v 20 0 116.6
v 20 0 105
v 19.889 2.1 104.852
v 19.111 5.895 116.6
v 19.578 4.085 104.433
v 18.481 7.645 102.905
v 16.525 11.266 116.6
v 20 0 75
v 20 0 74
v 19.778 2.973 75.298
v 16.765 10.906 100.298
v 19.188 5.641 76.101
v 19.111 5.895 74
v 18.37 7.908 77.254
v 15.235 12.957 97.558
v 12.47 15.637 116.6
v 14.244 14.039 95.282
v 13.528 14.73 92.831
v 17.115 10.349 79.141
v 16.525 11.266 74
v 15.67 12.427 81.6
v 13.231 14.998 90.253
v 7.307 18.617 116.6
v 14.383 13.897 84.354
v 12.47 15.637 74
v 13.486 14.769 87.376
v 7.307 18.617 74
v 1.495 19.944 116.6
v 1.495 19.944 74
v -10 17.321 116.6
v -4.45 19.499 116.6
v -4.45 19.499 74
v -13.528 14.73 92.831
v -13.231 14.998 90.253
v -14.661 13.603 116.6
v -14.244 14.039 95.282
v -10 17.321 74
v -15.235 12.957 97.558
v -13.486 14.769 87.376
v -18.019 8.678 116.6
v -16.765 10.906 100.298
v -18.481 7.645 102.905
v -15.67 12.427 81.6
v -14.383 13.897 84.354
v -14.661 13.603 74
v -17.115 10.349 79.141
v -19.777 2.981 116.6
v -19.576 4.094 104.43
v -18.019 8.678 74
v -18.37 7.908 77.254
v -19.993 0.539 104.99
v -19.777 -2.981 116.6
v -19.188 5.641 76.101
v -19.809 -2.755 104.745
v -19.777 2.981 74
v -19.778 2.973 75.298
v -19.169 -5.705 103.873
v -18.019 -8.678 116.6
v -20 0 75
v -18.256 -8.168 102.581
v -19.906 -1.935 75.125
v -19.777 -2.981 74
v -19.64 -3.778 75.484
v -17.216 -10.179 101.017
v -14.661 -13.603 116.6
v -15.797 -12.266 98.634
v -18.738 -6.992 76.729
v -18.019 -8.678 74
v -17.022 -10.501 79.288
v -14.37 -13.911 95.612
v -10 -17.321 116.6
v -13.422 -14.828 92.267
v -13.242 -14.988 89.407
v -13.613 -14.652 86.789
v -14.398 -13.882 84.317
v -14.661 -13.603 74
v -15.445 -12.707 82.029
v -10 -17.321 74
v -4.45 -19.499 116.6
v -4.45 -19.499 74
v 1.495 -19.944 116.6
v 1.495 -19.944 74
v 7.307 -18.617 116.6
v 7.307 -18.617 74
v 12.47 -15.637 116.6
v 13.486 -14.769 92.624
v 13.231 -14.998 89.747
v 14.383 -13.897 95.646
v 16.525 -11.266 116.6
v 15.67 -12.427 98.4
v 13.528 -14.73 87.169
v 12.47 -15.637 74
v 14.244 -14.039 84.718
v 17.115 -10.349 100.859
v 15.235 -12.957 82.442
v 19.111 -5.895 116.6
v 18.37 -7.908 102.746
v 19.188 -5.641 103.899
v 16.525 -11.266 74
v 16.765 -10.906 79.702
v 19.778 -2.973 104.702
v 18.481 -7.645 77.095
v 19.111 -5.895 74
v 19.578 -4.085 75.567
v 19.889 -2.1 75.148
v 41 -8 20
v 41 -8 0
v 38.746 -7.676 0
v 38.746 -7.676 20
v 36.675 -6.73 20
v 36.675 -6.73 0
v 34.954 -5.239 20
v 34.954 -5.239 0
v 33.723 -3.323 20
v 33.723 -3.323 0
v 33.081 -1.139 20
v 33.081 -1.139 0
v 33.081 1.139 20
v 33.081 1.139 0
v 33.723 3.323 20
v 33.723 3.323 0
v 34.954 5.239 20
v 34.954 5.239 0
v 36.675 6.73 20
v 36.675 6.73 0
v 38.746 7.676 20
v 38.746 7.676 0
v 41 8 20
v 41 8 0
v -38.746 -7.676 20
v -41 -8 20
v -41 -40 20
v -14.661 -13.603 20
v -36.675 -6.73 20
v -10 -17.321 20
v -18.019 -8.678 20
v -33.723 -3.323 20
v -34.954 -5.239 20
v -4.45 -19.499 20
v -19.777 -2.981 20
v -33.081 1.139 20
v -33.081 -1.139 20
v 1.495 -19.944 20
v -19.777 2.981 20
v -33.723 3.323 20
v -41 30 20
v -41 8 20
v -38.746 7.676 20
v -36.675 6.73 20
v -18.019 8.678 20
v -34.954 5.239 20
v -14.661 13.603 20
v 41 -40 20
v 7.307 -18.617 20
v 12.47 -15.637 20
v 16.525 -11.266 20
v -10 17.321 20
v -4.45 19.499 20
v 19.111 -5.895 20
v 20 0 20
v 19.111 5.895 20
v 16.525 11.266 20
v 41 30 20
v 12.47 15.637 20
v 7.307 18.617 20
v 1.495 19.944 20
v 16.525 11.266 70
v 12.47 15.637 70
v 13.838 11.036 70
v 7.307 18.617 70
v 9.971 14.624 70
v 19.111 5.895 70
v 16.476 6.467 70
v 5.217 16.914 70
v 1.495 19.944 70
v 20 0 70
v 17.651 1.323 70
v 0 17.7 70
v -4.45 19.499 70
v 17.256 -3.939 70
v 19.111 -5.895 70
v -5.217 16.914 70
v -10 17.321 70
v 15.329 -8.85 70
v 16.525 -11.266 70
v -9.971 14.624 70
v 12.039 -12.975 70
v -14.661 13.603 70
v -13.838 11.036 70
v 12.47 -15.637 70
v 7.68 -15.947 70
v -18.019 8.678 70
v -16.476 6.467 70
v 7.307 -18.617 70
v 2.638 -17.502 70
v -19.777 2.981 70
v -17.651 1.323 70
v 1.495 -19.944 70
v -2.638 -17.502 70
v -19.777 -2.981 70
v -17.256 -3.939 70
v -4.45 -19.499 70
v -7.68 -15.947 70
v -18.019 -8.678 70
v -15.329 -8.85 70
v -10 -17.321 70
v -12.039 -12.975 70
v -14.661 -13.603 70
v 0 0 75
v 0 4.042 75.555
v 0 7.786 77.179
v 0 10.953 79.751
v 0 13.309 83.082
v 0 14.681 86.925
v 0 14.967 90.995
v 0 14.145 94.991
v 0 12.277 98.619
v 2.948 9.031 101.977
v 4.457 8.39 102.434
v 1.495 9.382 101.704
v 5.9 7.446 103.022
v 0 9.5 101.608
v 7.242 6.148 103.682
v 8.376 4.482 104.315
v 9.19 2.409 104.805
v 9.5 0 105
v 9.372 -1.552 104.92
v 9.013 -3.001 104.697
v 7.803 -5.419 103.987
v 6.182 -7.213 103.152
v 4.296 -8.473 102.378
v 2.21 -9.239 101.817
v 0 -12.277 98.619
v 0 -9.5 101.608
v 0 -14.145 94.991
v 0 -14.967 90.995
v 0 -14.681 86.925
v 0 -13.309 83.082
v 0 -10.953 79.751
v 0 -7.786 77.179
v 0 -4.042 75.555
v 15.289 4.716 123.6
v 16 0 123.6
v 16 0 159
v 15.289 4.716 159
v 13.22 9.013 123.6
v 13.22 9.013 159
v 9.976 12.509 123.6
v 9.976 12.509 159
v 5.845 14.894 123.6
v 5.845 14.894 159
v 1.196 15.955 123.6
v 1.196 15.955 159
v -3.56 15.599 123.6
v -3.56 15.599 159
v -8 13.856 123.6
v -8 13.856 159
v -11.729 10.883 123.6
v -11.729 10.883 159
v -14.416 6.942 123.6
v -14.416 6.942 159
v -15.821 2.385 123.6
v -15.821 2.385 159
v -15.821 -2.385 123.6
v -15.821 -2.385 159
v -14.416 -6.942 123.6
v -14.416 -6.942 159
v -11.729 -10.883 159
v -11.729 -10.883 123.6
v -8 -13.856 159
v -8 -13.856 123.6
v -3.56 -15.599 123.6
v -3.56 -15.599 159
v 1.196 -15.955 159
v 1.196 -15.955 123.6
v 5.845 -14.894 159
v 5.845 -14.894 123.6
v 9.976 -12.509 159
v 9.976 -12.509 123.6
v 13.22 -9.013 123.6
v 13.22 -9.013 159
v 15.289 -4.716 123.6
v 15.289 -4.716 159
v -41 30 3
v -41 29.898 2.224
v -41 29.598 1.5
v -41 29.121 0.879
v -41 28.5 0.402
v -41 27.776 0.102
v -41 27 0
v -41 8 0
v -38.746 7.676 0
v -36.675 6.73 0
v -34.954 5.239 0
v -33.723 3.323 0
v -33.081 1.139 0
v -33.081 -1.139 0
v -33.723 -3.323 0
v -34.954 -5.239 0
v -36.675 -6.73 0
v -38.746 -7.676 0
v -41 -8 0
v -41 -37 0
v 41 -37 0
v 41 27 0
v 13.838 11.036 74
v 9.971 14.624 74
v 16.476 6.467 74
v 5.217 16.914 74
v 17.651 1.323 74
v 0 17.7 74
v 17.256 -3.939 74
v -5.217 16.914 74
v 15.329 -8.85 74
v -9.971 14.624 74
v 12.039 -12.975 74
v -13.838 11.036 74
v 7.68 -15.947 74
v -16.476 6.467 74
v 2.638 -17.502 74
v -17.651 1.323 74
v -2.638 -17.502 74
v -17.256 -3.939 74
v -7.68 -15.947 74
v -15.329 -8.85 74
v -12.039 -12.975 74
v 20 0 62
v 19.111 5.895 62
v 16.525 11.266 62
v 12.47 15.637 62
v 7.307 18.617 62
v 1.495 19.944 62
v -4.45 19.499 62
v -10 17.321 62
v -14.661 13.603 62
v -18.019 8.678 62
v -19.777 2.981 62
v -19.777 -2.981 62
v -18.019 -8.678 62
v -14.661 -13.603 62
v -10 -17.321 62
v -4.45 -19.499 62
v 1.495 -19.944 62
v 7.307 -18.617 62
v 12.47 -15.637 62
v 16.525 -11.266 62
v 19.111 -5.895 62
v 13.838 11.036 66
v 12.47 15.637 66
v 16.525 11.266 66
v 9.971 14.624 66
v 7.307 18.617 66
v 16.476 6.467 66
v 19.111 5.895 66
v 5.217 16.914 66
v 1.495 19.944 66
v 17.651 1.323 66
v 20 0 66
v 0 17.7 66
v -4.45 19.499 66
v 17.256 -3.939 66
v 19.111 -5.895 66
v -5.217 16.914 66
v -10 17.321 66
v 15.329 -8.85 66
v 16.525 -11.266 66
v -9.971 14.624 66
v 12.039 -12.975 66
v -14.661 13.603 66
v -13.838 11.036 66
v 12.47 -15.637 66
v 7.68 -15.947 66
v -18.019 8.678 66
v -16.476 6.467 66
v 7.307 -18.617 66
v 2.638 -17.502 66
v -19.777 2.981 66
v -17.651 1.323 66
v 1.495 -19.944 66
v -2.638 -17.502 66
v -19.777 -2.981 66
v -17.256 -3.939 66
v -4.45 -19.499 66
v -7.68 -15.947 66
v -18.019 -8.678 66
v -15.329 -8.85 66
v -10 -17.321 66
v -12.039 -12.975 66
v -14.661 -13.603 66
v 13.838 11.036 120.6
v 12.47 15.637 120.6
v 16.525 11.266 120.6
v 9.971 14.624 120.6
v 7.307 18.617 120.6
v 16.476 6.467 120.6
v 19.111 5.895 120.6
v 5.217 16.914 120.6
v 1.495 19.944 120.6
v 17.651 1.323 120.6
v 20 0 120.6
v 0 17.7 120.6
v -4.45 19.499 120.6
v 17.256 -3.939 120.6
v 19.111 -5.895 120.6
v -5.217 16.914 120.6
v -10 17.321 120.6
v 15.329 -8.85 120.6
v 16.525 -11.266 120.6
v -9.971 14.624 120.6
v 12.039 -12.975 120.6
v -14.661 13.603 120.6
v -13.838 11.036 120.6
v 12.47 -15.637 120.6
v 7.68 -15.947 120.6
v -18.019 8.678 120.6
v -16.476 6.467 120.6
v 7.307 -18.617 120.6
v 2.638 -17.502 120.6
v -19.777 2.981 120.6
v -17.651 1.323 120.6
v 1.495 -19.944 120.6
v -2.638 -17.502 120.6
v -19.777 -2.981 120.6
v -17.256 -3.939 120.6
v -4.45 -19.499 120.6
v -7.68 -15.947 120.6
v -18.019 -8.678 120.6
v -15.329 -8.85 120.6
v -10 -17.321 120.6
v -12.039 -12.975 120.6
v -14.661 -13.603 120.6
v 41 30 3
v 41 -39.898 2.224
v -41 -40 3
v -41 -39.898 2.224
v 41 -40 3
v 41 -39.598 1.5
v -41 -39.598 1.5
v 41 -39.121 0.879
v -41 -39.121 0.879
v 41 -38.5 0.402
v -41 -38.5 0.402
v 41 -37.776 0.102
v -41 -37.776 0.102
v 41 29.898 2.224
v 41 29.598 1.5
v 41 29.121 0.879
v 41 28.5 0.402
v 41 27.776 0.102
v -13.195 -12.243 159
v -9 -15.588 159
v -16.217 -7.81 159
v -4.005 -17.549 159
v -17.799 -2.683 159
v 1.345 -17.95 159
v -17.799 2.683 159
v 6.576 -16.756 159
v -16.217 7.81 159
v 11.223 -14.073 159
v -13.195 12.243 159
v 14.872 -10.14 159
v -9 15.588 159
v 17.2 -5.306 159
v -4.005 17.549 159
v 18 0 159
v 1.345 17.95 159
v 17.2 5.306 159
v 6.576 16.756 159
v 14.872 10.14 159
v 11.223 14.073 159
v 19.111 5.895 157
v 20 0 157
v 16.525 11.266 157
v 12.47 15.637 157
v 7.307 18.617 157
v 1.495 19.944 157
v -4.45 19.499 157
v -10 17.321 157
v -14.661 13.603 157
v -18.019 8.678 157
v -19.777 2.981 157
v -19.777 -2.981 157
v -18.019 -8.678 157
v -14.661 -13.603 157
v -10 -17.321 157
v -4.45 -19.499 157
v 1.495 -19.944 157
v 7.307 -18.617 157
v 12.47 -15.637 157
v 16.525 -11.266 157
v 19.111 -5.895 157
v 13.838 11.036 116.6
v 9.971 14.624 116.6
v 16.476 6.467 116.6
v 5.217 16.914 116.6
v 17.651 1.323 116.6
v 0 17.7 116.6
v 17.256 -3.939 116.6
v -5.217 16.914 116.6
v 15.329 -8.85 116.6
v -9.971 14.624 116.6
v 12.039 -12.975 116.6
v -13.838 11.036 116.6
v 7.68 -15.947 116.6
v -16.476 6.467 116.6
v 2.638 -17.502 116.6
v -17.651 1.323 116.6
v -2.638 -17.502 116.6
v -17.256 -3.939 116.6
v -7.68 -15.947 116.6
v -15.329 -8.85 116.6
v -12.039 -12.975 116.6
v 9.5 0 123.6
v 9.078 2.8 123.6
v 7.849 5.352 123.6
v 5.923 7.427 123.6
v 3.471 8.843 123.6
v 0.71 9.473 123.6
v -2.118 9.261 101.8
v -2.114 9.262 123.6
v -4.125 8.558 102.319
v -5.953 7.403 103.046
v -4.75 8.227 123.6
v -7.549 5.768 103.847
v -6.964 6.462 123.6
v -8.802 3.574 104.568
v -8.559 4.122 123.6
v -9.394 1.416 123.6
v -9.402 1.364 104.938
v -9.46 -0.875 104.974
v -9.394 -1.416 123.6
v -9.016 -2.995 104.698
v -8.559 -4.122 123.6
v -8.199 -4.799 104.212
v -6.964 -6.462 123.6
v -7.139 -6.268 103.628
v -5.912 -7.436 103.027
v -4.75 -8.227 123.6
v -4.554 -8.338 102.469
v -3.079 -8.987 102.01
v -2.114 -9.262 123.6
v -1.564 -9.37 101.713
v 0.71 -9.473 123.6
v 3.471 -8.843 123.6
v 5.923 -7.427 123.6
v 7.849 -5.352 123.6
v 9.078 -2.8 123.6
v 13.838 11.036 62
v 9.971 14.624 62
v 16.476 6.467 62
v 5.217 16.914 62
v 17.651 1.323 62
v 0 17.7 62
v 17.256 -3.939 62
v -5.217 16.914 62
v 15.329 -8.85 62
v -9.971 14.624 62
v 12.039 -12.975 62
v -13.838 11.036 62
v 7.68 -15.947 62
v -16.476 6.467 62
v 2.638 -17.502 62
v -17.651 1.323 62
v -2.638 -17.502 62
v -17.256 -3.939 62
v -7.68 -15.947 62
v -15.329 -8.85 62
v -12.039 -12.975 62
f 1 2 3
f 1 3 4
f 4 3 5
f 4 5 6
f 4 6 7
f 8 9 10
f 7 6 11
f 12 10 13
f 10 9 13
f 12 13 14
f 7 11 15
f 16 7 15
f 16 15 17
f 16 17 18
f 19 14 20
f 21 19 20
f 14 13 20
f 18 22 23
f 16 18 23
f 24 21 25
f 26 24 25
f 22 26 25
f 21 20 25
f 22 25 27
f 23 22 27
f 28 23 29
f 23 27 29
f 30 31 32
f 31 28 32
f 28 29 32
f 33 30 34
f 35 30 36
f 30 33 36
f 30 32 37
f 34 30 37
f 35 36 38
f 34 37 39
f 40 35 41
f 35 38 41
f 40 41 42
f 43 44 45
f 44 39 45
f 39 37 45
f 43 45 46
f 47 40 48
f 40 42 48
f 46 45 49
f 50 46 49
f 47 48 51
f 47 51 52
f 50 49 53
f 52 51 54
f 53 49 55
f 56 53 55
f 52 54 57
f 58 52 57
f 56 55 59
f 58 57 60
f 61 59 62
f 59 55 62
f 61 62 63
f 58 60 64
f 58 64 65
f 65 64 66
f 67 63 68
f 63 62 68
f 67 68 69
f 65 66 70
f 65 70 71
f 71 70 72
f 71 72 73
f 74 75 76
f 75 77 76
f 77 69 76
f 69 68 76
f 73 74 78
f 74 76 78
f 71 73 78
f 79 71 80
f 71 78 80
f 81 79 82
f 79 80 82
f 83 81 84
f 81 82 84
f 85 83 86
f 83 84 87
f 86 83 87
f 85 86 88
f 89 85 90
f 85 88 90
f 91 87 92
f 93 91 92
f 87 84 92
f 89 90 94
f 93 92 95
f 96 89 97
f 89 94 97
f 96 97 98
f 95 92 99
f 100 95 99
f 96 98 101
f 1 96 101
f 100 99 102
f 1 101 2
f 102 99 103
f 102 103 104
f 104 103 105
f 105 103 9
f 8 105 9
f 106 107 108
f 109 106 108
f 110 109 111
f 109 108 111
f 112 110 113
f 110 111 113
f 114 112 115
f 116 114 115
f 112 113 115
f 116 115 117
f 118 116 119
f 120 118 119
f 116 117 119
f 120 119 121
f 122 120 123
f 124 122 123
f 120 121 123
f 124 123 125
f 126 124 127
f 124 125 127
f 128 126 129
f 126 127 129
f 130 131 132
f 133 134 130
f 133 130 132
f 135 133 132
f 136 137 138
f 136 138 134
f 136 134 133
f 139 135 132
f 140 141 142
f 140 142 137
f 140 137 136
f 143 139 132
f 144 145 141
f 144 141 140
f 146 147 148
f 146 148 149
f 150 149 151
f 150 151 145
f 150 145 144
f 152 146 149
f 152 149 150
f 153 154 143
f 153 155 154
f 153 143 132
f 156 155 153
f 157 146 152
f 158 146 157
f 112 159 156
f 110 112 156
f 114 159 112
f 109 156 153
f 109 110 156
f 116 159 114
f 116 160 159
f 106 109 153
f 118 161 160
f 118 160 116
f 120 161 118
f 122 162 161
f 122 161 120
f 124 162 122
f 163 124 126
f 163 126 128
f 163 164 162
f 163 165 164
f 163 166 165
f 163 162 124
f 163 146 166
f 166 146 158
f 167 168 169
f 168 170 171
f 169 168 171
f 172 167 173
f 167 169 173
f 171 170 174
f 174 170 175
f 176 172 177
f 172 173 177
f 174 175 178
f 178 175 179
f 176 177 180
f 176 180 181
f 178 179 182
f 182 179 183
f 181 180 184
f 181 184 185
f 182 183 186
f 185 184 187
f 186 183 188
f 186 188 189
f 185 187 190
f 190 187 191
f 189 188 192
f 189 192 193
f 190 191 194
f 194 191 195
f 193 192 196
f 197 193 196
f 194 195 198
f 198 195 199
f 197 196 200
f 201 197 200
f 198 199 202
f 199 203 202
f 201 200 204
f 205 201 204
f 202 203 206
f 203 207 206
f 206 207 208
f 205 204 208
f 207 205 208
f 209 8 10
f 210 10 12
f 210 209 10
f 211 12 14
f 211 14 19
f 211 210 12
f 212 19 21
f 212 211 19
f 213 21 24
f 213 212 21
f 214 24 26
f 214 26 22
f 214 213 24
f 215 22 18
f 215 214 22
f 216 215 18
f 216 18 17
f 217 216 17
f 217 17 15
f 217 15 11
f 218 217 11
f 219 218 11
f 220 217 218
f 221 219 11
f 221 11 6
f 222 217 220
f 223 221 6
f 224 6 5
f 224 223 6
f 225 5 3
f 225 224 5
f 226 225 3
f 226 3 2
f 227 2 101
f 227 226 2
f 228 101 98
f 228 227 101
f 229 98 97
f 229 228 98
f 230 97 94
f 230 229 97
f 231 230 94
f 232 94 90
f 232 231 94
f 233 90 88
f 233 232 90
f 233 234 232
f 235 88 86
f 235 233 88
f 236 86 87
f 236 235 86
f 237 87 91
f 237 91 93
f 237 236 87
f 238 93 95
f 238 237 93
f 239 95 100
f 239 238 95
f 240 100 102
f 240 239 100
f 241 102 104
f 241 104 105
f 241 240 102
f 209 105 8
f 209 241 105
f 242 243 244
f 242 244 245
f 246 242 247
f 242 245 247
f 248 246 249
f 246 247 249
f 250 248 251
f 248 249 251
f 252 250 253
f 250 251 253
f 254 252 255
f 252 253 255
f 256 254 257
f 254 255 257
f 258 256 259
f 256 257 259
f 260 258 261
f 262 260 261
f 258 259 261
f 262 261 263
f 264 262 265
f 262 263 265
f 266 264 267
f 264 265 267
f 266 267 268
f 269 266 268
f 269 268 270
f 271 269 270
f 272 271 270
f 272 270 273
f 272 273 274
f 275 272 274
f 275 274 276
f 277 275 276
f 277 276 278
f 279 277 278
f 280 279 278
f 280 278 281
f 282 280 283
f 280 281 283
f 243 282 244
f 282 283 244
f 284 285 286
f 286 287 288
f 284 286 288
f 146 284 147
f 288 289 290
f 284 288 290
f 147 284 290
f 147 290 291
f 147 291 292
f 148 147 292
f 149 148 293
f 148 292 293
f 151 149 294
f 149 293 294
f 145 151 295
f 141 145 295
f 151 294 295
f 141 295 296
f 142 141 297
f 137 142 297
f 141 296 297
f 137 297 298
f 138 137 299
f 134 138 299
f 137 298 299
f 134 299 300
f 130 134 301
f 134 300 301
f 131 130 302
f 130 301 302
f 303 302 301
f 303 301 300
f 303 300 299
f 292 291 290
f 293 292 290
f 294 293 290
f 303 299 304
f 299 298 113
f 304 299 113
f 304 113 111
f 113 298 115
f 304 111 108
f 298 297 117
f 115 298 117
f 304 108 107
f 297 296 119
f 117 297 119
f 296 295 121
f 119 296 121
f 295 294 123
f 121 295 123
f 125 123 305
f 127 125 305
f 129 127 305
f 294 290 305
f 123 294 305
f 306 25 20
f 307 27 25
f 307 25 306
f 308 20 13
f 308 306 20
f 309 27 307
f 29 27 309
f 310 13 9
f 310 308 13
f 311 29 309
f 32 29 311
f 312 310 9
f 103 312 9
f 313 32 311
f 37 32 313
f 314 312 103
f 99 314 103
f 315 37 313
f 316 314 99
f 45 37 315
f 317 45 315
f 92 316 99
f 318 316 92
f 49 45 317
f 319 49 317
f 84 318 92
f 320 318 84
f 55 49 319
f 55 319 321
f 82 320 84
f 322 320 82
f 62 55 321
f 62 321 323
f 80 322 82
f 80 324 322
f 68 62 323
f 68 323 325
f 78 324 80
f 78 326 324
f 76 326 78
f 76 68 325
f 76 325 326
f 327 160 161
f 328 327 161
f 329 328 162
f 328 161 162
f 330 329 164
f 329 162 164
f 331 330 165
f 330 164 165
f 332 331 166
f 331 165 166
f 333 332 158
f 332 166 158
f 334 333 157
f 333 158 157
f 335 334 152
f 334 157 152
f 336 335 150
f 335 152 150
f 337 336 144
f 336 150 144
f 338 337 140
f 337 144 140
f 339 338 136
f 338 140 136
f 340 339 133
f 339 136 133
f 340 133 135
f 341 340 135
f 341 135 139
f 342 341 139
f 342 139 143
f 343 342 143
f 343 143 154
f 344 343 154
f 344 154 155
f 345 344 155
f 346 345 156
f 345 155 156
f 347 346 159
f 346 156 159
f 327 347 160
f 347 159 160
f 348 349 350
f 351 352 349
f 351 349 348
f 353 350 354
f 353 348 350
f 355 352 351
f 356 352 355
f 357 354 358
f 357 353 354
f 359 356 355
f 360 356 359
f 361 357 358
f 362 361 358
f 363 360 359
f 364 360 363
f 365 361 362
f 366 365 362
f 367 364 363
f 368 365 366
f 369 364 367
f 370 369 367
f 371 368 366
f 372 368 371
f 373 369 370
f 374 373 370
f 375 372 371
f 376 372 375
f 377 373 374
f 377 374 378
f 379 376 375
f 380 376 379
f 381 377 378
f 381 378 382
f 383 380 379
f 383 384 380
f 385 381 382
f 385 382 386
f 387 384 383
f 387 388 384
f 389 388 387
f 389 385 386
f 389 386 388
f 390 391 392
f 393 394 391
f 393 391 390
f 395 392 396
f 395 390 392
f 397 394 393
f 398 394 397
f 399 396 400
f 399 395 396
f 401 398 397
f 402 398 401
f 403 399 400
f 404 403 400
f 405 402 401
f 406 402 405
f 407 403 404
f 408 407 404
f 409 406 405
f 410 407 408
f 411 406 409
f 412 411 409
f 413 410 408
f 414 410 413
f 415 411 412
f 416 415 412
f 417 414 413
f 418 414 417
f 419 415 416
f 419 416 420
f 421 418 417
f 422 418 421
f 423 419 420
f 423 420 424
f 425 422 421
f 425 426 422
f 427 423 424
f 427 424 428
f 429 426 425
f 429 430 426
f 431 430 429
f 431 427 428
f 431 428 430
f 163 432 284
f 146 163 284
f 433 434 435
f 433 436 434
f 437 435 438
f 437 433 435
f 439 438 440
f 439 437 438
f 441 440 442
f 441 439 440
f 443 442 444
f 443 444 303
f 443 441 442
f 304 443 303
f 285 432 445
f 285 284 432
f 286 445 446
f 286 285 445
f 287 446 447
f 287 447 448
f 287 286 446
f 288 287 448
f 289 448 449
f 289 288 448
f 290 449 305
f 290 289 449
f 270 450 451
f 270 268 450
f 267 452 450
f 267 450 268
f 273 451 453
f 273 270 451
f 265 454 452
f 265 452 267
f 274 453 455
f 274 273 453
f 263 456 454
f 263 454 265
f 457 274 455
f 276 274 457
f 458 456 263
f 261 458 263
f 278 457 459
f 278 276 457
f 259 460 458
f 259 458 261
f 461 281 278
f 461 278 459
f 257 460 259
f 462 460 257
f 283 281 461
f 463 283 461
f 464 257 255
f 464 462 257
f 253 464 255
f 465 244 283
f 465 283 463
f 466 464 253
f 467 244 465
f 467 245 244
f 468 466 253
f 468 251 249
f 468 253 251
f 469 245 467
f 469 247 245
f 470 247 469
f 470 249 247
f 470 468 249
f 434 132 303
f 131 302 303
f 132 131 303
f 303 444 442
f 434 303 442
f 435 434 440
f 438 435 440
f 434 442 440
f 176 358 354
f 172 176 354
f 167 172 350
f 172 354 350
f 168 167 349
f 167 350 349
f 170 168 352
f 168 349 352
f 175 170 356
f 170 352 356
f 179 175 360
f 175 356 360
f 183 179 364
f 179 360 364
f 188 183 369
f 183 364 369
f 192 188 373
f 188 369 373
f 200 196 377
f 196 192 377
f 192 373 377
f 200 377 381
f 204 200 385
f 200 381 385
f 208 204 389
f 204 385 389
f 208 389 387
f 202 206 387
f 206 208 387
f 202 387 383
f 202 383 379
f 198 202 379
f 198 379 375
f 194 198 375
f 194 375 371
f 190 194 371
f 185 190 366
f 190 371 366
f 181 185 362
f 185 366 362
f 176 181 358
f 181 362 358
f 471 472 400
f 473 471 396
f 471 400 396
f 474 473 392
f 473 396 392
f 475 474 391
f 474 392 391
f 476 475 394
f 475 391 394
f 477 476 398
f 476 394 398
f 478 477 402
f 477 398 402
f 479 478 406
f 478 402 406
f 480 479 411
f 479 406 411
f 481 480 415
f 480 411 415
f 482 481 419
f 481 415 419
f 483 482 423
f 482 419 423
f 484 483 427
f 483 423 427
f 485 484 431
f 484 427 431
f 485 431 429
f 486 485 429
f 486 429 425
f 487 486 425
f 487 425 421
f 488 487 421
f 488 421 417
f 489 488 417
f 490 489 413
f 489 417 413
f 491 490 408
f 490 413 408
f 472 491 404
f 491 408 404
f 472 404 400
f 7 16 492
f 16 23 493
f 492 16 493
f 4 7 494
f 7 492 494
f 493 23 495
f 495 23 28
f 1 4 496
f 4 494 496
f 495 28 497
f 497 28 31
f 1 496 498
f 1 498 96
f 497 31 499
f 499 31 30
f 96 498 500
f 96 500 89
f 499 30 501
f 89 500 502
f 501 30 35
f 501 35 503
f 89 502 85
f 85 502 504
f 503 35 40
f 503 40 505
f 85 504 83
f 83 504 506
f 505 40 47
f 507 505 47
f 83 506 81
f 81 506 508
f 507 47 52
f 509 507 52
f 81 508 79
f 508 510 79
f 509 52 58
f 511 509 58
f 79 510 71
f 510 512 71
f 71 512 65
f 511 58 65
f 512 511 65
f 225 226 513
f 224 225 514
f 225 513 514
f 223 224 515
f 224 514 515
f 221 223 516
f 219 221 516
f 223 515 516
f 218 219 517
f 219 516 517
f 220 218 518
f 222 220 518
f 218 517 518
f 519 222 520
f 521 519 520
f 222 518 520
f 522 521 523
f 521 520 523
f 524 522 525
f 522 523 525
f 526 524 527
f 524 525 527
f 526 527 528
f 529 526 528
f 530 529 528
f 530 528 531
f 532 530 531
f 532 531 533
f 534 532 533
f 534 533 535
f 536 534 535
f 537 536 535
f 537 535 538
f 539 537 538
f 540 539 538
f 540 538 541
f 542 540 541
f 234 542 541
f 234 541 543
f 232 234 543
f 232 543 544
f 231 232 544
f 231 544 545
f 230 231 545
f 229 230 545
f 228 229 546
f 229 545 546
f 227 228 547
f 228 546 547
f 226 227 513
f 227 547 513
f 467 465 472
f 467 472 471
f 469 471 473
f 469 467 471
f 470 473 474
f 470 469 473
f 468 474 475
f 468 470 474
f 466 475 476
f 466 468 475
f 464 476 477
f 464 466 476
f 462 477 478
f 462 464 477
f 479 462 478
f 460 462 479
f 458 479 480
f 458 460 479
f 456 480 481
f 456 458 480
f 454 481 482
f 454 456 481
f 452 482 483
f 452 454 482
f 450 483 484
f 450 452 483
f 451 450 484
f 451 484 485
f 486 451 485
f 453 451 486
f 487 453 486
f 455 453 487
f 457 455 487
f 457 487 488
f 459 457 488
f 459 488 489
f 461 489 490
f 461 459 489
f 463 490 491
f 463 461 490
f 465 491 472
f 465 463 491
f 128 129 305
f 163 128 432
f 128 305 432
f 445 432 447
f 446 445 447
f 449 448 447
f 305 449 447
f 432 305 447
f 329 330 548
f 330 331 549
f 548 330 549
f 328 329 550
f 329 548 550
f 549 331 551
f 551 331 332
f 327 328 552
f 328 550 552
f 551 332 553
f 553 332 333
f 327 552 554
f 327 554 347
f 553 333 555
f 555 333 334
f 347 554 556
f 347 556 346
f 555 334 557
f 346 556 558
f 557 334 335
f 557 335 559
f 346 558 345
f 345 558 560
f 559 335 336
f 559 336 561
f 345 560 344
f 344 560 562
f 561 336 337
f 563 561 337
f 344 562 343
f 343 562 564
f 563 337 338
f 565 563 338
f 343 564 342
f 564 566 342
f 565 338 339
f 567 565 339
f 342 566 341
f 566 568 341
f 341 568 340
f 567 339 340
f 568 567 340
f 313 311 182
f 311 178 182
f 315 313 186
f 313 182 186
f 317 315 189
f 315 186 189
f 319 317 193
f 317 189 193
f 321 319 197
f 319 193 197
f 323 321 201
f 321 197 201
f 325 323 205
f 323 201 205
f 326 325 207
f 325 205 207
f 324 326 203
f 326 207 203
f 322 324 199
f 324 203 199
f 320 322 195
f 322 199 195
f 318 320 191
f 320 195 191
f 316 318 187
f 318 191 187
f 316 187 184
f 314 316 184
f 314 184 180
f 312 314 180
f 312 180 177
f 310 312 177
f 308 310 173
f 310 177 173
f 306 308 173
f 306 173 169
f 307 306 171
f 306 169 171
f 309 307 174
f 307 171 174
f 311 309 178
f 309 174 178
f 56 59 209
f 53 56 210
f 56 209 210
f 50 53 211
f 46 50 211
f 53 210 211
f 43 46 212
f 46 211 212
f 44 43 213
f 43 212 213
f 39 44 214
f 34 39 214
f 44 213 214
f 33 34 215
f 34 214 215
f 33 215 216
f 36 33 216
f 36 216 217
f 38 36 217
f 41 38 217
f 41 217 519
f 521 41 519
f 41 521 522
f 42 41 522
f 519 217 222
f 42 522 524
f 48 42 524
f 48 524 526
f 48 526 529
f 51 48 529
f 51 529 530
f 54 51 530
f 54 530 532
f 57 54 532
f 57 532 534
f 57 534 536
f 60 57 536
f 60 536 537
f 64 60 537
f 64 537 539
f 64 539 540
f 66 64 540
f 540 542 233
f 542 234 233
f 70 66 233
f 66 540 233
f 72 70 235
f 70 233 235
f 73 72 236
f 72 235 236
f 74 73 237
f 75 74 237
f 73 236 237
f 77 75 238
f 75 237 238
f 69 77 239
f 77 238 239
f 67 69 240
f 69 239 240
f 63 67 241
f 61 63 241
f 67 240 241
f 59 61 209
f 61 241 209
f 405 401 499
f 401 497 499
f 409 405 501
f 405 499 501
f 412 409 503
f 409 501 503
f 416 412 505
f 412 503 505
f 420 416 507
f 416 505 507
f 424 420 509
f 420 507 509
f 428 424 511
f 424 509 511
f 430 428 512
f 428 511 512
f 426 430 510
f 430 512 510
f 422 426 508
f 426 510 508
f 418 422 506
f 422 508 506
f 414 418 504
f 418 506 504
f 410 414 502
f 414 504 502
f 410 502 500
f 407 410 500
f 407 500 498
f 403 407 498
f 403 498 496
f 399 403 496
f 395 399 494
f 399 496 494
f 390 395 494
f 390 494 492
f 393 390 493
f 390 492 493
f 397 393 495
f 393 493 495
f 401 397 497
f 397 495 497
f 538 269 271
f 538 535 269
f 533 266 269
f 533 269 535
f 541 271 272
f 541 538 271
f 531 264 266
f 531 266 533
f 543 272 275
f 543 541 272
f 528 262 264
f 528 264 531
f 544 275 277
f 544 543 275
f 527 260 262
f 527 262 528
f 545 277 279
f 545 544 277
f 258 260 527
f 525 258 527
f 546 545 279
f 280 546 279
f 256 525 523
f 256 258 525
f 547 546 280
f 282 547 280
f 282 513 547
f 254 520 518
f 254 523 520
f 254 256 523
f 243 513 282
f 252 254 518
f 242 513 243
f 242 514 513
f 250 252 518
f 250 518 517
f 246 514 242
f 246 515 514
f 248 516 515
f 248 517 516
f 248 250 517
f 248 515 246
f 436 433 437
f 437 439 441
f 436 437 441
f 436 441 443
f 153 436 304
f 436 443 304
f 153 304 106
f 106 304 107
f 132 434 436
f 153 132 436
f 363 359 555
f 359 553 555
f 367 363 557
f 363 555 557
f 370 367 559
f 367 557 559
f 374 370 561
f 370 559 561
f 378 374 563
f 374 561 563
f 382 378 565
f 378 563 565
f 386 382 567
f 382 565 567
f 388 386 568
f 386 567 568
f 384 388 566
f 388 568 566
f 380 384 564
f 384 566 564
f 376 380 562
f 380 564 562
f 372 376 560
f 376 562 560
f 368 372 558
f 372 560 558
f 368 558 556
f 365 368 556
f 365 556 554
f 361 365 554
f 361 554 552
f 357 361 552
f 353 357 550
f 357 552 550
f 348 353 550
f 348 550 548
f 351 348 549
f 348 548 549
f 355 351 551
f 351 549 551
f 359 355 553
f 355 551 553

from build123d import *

# Parameters (mm, degrees)
BOSS_EXTRUDE1_DEPTH     = 20
SKETCH2_R               = 20
BOSS_EXTRUDE2_DEPTH     = 139
SKETCH3_R               = 15
CUT_EXTRUDE1_DEPTH      = 42
CUT_EXTRUDE1_DEPTH_BACK = 42
SKETCH4_W               = 4
SKETCH4_H               = 2.3
SKETCH5_R               = 16
CUT_EXTRUDE2_DEPTH      = 35.4
SKETCH6_R               = 9.5
CUT_EXTRUDE3_DEPTH      = 22
CHAMFER1_SIZE           = 2
FILLET1_R               = 3


with BuildPart() as part:
    # Sketch1 → Boss-Extrude1 (new body)
    with BuildSketch(Plane.XY):
        with BuildLine():
            Line((-41, -8), (-41, -40))
            Line((-41, -40), (41, -40))
            Line((41, -40), (41, -8))
            ThreePointArc((41, -8), (33, 0), (41, 8))
            Line((41, 8), (41, 30))
            Line((41, 30), (-41, 30))
            Line((-41, 30), (-41, 8))
            ThreePointArc((-41, 8), (-33, 0), (-41, -8))
        make_face()
    extrude(amount=BOSS_EXTRUDE1_DEPTH)

    # Sketch2 → Boss-Extrude2 (add)
    with BuildSketch(Plane.XY.offset(20)):
        Circle(SKETCH2_R)
    extrude(amount=BOSS_EXTRUDE2_DEPTH)

    # Sketch3 → Cut-Extrude1 (cut, two sides)
    with BuildSketch(Plane(origin=(0, 0, 0), x_dir=(0, 0, -1), z_dir=(1, 0, 0))) as cut_extrude1_sk:
        with Locations((-90, 0)):
            Circle(SKETCH3_R)
    extrude(amount=CUT_EXTRUDE1_DEPTH, mode=Mode.SUBTRACT)
    extrude(cut_extrude1_sk.sketch, amount=-CUT_EXTRUDE1_DEPTH_BACK, mode=Mode.SUBTRACT)

    # Sketch4 → Cut-Revolve1 (revolve, cut)
    with BuildSketch(Plane(origin=(0, 0, 0), x_dir=(0, 0, -1), z_dir=(1, 0, 0))):
        with Locations((-64, 18.85)):
            Rectangle(SKETCH4_W, SKETCH4_H)
        with Locations((-72, 18.85)):
            Rectangle(SKETCH4_W, SKETCH4_H)
        with Locations((-118.6, 18.85)):
            Rectangle(SKETCH4_W, SKETCH4_H)
    revolve(axis=Axis((0, 0, 0), (0, 0, 1)), mode=Mode.SUBTRACT)

    # Sketch5 → Cut-Extrude2 (cut)
    with BuildSketch(Plane.XY.offset(159)):
        Circle(SKETCH5_R)
    extrude(amount=-CUT_EXTRUDE2_DEPTH, mode=Mode.SUBTRACT)

    # Sketch6 → Cut-Extrude3 (cut)
    with BuildSketch(Plane.XY.offset(123.6)):
        Circle(SKETCH6_R)
    extrude(amount=-CUT_EXTRUDE3_DEPTH, mode=Mode.SUBTRACT)

    # Chamfer1
    chamfer1_edges = [part.edges().sort_by_distance(p)[0] for p in [
        (-20, 0, 159),
    ]]
    chamfer(chamfer1_edges, length=CHAMFER1_SIZE)

    # Fillet1
    fillet1_edges = [part.edges().sort_by_distance(p)[0] for p in [
        (0, -40, 0),
        (0, 30, 0),
    ]]
    fillet(fillet1_edges, radius=FILLET1_R)


solid = part.part
